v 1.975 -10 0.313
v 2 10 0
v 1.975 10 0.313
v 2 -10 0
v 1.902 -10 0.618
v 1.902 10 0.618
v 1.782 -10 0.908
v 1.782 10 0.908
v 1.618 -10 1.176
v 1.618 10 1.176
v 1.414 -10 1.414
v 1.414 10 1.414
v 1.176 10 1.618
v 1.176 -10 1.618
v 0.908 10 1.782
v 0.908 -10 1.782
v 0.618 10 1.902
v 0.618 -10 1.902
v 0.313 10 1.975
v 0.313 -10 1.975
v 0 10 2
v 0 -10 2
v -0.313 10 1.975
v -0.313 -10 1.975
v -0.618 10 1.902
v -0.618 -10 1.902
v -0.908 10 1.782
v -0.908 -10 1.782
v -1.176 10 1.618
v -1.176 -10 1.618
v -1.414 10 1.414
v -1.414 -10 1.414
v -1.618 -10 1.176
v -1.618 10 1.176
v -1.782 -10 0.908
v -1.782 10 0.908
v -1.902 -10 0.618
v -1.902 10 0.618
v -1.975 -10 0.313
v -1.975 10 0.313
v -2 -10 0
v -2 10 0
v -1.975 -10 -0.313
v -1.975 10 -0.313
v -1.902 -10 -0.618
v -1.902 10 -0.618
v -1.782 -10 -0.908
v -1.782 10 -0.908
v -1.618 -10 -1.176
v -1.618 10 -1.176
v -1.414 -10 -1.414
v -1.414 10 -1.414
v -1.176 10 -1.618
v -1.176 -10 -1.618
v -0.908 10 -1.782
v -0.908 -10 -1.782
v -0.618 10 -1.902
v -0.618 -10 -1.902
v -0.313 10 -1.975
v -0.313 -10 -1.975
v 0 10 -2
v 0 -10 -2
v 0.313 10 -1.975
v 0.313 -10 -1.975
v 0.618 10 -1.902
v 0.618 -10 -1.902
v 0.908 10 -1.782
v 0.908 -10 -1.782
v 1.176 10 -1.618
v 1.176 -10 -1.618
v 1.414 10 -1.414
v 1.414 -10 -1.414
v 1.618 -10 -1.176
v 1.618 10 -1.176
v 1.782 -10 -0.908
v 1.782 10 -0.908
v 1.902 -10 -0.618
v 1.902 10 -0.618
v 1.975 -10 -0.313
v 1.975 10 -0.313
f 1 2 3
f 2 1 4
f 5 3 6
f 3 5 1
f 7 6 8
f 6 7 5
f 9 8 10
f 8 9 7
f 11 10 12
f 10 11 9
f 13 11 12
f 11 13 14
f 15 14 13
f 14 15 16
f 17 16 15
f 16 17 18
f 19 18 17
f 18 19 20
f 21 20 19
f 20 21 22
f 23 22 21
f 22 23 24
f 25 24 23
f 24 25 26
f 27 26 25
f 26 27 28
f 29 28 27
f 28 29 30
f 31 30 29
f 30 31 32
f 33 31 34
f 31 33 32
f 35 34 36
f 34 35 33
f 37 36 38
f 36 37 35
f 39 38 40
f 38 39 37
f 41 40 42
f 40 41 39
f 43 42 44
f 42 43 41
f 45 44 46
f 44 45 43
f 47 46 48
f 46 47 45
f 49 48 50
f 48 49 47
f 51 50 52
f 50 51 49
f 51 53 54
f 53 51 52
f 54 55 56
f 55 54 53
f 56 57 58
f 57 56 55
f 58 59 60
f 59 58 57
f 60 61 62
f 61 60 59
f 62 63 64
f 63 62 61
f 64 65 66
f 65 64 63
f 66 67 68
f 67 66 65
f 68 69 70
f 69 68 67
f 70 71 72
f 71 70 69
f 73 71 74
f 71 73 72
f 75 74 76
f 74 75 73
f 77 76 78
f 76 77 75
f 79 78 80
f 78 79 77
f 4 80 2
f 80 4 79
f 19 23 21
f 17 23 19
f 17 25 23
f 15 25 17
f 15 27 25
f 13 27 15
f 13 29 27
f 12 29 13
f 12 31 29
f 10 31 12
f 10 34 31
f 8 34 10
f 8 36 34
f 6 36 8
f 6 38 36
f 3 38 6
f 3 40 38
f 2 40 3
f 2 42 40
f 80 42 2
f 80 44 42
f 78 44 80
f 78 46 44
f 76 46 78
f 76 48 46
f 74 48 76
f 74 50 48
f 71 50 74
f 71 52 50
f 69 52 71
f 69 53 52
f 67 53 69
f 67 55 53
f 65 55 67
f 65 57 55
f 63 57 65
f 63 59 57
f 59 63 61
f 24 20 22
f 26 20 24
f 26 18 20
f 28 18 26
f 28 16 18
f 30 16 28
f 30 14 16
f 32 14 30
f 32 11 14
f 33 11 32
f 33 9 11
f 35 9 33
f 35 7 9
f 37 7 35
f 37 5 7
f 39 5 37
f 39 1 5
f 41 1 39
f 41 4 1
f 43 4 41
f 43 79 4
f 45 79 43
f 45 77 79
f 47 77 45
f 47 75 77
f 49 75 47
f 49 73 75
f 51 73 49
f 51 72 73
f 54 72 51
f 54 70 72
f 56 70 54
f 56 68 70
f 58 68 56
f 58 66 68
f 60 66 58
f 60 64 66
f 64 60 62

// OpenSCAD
// See http://en.wikibooks.org/wiki/OpenSCAD_User_Manual/The_OpenSCAD_Language#Modifier_Characters
// Ignore the rest of the design and use this subtree as design root.
// Usage
//   ! { ... }


difference() {
	cube(10, center = true);
	translate([0, 0, 5]) {
		!rotate([90, 0, 0]) {
			#cylinder(r = 2, h = 20, center = true, $fn = 40);
		}
	}
}
